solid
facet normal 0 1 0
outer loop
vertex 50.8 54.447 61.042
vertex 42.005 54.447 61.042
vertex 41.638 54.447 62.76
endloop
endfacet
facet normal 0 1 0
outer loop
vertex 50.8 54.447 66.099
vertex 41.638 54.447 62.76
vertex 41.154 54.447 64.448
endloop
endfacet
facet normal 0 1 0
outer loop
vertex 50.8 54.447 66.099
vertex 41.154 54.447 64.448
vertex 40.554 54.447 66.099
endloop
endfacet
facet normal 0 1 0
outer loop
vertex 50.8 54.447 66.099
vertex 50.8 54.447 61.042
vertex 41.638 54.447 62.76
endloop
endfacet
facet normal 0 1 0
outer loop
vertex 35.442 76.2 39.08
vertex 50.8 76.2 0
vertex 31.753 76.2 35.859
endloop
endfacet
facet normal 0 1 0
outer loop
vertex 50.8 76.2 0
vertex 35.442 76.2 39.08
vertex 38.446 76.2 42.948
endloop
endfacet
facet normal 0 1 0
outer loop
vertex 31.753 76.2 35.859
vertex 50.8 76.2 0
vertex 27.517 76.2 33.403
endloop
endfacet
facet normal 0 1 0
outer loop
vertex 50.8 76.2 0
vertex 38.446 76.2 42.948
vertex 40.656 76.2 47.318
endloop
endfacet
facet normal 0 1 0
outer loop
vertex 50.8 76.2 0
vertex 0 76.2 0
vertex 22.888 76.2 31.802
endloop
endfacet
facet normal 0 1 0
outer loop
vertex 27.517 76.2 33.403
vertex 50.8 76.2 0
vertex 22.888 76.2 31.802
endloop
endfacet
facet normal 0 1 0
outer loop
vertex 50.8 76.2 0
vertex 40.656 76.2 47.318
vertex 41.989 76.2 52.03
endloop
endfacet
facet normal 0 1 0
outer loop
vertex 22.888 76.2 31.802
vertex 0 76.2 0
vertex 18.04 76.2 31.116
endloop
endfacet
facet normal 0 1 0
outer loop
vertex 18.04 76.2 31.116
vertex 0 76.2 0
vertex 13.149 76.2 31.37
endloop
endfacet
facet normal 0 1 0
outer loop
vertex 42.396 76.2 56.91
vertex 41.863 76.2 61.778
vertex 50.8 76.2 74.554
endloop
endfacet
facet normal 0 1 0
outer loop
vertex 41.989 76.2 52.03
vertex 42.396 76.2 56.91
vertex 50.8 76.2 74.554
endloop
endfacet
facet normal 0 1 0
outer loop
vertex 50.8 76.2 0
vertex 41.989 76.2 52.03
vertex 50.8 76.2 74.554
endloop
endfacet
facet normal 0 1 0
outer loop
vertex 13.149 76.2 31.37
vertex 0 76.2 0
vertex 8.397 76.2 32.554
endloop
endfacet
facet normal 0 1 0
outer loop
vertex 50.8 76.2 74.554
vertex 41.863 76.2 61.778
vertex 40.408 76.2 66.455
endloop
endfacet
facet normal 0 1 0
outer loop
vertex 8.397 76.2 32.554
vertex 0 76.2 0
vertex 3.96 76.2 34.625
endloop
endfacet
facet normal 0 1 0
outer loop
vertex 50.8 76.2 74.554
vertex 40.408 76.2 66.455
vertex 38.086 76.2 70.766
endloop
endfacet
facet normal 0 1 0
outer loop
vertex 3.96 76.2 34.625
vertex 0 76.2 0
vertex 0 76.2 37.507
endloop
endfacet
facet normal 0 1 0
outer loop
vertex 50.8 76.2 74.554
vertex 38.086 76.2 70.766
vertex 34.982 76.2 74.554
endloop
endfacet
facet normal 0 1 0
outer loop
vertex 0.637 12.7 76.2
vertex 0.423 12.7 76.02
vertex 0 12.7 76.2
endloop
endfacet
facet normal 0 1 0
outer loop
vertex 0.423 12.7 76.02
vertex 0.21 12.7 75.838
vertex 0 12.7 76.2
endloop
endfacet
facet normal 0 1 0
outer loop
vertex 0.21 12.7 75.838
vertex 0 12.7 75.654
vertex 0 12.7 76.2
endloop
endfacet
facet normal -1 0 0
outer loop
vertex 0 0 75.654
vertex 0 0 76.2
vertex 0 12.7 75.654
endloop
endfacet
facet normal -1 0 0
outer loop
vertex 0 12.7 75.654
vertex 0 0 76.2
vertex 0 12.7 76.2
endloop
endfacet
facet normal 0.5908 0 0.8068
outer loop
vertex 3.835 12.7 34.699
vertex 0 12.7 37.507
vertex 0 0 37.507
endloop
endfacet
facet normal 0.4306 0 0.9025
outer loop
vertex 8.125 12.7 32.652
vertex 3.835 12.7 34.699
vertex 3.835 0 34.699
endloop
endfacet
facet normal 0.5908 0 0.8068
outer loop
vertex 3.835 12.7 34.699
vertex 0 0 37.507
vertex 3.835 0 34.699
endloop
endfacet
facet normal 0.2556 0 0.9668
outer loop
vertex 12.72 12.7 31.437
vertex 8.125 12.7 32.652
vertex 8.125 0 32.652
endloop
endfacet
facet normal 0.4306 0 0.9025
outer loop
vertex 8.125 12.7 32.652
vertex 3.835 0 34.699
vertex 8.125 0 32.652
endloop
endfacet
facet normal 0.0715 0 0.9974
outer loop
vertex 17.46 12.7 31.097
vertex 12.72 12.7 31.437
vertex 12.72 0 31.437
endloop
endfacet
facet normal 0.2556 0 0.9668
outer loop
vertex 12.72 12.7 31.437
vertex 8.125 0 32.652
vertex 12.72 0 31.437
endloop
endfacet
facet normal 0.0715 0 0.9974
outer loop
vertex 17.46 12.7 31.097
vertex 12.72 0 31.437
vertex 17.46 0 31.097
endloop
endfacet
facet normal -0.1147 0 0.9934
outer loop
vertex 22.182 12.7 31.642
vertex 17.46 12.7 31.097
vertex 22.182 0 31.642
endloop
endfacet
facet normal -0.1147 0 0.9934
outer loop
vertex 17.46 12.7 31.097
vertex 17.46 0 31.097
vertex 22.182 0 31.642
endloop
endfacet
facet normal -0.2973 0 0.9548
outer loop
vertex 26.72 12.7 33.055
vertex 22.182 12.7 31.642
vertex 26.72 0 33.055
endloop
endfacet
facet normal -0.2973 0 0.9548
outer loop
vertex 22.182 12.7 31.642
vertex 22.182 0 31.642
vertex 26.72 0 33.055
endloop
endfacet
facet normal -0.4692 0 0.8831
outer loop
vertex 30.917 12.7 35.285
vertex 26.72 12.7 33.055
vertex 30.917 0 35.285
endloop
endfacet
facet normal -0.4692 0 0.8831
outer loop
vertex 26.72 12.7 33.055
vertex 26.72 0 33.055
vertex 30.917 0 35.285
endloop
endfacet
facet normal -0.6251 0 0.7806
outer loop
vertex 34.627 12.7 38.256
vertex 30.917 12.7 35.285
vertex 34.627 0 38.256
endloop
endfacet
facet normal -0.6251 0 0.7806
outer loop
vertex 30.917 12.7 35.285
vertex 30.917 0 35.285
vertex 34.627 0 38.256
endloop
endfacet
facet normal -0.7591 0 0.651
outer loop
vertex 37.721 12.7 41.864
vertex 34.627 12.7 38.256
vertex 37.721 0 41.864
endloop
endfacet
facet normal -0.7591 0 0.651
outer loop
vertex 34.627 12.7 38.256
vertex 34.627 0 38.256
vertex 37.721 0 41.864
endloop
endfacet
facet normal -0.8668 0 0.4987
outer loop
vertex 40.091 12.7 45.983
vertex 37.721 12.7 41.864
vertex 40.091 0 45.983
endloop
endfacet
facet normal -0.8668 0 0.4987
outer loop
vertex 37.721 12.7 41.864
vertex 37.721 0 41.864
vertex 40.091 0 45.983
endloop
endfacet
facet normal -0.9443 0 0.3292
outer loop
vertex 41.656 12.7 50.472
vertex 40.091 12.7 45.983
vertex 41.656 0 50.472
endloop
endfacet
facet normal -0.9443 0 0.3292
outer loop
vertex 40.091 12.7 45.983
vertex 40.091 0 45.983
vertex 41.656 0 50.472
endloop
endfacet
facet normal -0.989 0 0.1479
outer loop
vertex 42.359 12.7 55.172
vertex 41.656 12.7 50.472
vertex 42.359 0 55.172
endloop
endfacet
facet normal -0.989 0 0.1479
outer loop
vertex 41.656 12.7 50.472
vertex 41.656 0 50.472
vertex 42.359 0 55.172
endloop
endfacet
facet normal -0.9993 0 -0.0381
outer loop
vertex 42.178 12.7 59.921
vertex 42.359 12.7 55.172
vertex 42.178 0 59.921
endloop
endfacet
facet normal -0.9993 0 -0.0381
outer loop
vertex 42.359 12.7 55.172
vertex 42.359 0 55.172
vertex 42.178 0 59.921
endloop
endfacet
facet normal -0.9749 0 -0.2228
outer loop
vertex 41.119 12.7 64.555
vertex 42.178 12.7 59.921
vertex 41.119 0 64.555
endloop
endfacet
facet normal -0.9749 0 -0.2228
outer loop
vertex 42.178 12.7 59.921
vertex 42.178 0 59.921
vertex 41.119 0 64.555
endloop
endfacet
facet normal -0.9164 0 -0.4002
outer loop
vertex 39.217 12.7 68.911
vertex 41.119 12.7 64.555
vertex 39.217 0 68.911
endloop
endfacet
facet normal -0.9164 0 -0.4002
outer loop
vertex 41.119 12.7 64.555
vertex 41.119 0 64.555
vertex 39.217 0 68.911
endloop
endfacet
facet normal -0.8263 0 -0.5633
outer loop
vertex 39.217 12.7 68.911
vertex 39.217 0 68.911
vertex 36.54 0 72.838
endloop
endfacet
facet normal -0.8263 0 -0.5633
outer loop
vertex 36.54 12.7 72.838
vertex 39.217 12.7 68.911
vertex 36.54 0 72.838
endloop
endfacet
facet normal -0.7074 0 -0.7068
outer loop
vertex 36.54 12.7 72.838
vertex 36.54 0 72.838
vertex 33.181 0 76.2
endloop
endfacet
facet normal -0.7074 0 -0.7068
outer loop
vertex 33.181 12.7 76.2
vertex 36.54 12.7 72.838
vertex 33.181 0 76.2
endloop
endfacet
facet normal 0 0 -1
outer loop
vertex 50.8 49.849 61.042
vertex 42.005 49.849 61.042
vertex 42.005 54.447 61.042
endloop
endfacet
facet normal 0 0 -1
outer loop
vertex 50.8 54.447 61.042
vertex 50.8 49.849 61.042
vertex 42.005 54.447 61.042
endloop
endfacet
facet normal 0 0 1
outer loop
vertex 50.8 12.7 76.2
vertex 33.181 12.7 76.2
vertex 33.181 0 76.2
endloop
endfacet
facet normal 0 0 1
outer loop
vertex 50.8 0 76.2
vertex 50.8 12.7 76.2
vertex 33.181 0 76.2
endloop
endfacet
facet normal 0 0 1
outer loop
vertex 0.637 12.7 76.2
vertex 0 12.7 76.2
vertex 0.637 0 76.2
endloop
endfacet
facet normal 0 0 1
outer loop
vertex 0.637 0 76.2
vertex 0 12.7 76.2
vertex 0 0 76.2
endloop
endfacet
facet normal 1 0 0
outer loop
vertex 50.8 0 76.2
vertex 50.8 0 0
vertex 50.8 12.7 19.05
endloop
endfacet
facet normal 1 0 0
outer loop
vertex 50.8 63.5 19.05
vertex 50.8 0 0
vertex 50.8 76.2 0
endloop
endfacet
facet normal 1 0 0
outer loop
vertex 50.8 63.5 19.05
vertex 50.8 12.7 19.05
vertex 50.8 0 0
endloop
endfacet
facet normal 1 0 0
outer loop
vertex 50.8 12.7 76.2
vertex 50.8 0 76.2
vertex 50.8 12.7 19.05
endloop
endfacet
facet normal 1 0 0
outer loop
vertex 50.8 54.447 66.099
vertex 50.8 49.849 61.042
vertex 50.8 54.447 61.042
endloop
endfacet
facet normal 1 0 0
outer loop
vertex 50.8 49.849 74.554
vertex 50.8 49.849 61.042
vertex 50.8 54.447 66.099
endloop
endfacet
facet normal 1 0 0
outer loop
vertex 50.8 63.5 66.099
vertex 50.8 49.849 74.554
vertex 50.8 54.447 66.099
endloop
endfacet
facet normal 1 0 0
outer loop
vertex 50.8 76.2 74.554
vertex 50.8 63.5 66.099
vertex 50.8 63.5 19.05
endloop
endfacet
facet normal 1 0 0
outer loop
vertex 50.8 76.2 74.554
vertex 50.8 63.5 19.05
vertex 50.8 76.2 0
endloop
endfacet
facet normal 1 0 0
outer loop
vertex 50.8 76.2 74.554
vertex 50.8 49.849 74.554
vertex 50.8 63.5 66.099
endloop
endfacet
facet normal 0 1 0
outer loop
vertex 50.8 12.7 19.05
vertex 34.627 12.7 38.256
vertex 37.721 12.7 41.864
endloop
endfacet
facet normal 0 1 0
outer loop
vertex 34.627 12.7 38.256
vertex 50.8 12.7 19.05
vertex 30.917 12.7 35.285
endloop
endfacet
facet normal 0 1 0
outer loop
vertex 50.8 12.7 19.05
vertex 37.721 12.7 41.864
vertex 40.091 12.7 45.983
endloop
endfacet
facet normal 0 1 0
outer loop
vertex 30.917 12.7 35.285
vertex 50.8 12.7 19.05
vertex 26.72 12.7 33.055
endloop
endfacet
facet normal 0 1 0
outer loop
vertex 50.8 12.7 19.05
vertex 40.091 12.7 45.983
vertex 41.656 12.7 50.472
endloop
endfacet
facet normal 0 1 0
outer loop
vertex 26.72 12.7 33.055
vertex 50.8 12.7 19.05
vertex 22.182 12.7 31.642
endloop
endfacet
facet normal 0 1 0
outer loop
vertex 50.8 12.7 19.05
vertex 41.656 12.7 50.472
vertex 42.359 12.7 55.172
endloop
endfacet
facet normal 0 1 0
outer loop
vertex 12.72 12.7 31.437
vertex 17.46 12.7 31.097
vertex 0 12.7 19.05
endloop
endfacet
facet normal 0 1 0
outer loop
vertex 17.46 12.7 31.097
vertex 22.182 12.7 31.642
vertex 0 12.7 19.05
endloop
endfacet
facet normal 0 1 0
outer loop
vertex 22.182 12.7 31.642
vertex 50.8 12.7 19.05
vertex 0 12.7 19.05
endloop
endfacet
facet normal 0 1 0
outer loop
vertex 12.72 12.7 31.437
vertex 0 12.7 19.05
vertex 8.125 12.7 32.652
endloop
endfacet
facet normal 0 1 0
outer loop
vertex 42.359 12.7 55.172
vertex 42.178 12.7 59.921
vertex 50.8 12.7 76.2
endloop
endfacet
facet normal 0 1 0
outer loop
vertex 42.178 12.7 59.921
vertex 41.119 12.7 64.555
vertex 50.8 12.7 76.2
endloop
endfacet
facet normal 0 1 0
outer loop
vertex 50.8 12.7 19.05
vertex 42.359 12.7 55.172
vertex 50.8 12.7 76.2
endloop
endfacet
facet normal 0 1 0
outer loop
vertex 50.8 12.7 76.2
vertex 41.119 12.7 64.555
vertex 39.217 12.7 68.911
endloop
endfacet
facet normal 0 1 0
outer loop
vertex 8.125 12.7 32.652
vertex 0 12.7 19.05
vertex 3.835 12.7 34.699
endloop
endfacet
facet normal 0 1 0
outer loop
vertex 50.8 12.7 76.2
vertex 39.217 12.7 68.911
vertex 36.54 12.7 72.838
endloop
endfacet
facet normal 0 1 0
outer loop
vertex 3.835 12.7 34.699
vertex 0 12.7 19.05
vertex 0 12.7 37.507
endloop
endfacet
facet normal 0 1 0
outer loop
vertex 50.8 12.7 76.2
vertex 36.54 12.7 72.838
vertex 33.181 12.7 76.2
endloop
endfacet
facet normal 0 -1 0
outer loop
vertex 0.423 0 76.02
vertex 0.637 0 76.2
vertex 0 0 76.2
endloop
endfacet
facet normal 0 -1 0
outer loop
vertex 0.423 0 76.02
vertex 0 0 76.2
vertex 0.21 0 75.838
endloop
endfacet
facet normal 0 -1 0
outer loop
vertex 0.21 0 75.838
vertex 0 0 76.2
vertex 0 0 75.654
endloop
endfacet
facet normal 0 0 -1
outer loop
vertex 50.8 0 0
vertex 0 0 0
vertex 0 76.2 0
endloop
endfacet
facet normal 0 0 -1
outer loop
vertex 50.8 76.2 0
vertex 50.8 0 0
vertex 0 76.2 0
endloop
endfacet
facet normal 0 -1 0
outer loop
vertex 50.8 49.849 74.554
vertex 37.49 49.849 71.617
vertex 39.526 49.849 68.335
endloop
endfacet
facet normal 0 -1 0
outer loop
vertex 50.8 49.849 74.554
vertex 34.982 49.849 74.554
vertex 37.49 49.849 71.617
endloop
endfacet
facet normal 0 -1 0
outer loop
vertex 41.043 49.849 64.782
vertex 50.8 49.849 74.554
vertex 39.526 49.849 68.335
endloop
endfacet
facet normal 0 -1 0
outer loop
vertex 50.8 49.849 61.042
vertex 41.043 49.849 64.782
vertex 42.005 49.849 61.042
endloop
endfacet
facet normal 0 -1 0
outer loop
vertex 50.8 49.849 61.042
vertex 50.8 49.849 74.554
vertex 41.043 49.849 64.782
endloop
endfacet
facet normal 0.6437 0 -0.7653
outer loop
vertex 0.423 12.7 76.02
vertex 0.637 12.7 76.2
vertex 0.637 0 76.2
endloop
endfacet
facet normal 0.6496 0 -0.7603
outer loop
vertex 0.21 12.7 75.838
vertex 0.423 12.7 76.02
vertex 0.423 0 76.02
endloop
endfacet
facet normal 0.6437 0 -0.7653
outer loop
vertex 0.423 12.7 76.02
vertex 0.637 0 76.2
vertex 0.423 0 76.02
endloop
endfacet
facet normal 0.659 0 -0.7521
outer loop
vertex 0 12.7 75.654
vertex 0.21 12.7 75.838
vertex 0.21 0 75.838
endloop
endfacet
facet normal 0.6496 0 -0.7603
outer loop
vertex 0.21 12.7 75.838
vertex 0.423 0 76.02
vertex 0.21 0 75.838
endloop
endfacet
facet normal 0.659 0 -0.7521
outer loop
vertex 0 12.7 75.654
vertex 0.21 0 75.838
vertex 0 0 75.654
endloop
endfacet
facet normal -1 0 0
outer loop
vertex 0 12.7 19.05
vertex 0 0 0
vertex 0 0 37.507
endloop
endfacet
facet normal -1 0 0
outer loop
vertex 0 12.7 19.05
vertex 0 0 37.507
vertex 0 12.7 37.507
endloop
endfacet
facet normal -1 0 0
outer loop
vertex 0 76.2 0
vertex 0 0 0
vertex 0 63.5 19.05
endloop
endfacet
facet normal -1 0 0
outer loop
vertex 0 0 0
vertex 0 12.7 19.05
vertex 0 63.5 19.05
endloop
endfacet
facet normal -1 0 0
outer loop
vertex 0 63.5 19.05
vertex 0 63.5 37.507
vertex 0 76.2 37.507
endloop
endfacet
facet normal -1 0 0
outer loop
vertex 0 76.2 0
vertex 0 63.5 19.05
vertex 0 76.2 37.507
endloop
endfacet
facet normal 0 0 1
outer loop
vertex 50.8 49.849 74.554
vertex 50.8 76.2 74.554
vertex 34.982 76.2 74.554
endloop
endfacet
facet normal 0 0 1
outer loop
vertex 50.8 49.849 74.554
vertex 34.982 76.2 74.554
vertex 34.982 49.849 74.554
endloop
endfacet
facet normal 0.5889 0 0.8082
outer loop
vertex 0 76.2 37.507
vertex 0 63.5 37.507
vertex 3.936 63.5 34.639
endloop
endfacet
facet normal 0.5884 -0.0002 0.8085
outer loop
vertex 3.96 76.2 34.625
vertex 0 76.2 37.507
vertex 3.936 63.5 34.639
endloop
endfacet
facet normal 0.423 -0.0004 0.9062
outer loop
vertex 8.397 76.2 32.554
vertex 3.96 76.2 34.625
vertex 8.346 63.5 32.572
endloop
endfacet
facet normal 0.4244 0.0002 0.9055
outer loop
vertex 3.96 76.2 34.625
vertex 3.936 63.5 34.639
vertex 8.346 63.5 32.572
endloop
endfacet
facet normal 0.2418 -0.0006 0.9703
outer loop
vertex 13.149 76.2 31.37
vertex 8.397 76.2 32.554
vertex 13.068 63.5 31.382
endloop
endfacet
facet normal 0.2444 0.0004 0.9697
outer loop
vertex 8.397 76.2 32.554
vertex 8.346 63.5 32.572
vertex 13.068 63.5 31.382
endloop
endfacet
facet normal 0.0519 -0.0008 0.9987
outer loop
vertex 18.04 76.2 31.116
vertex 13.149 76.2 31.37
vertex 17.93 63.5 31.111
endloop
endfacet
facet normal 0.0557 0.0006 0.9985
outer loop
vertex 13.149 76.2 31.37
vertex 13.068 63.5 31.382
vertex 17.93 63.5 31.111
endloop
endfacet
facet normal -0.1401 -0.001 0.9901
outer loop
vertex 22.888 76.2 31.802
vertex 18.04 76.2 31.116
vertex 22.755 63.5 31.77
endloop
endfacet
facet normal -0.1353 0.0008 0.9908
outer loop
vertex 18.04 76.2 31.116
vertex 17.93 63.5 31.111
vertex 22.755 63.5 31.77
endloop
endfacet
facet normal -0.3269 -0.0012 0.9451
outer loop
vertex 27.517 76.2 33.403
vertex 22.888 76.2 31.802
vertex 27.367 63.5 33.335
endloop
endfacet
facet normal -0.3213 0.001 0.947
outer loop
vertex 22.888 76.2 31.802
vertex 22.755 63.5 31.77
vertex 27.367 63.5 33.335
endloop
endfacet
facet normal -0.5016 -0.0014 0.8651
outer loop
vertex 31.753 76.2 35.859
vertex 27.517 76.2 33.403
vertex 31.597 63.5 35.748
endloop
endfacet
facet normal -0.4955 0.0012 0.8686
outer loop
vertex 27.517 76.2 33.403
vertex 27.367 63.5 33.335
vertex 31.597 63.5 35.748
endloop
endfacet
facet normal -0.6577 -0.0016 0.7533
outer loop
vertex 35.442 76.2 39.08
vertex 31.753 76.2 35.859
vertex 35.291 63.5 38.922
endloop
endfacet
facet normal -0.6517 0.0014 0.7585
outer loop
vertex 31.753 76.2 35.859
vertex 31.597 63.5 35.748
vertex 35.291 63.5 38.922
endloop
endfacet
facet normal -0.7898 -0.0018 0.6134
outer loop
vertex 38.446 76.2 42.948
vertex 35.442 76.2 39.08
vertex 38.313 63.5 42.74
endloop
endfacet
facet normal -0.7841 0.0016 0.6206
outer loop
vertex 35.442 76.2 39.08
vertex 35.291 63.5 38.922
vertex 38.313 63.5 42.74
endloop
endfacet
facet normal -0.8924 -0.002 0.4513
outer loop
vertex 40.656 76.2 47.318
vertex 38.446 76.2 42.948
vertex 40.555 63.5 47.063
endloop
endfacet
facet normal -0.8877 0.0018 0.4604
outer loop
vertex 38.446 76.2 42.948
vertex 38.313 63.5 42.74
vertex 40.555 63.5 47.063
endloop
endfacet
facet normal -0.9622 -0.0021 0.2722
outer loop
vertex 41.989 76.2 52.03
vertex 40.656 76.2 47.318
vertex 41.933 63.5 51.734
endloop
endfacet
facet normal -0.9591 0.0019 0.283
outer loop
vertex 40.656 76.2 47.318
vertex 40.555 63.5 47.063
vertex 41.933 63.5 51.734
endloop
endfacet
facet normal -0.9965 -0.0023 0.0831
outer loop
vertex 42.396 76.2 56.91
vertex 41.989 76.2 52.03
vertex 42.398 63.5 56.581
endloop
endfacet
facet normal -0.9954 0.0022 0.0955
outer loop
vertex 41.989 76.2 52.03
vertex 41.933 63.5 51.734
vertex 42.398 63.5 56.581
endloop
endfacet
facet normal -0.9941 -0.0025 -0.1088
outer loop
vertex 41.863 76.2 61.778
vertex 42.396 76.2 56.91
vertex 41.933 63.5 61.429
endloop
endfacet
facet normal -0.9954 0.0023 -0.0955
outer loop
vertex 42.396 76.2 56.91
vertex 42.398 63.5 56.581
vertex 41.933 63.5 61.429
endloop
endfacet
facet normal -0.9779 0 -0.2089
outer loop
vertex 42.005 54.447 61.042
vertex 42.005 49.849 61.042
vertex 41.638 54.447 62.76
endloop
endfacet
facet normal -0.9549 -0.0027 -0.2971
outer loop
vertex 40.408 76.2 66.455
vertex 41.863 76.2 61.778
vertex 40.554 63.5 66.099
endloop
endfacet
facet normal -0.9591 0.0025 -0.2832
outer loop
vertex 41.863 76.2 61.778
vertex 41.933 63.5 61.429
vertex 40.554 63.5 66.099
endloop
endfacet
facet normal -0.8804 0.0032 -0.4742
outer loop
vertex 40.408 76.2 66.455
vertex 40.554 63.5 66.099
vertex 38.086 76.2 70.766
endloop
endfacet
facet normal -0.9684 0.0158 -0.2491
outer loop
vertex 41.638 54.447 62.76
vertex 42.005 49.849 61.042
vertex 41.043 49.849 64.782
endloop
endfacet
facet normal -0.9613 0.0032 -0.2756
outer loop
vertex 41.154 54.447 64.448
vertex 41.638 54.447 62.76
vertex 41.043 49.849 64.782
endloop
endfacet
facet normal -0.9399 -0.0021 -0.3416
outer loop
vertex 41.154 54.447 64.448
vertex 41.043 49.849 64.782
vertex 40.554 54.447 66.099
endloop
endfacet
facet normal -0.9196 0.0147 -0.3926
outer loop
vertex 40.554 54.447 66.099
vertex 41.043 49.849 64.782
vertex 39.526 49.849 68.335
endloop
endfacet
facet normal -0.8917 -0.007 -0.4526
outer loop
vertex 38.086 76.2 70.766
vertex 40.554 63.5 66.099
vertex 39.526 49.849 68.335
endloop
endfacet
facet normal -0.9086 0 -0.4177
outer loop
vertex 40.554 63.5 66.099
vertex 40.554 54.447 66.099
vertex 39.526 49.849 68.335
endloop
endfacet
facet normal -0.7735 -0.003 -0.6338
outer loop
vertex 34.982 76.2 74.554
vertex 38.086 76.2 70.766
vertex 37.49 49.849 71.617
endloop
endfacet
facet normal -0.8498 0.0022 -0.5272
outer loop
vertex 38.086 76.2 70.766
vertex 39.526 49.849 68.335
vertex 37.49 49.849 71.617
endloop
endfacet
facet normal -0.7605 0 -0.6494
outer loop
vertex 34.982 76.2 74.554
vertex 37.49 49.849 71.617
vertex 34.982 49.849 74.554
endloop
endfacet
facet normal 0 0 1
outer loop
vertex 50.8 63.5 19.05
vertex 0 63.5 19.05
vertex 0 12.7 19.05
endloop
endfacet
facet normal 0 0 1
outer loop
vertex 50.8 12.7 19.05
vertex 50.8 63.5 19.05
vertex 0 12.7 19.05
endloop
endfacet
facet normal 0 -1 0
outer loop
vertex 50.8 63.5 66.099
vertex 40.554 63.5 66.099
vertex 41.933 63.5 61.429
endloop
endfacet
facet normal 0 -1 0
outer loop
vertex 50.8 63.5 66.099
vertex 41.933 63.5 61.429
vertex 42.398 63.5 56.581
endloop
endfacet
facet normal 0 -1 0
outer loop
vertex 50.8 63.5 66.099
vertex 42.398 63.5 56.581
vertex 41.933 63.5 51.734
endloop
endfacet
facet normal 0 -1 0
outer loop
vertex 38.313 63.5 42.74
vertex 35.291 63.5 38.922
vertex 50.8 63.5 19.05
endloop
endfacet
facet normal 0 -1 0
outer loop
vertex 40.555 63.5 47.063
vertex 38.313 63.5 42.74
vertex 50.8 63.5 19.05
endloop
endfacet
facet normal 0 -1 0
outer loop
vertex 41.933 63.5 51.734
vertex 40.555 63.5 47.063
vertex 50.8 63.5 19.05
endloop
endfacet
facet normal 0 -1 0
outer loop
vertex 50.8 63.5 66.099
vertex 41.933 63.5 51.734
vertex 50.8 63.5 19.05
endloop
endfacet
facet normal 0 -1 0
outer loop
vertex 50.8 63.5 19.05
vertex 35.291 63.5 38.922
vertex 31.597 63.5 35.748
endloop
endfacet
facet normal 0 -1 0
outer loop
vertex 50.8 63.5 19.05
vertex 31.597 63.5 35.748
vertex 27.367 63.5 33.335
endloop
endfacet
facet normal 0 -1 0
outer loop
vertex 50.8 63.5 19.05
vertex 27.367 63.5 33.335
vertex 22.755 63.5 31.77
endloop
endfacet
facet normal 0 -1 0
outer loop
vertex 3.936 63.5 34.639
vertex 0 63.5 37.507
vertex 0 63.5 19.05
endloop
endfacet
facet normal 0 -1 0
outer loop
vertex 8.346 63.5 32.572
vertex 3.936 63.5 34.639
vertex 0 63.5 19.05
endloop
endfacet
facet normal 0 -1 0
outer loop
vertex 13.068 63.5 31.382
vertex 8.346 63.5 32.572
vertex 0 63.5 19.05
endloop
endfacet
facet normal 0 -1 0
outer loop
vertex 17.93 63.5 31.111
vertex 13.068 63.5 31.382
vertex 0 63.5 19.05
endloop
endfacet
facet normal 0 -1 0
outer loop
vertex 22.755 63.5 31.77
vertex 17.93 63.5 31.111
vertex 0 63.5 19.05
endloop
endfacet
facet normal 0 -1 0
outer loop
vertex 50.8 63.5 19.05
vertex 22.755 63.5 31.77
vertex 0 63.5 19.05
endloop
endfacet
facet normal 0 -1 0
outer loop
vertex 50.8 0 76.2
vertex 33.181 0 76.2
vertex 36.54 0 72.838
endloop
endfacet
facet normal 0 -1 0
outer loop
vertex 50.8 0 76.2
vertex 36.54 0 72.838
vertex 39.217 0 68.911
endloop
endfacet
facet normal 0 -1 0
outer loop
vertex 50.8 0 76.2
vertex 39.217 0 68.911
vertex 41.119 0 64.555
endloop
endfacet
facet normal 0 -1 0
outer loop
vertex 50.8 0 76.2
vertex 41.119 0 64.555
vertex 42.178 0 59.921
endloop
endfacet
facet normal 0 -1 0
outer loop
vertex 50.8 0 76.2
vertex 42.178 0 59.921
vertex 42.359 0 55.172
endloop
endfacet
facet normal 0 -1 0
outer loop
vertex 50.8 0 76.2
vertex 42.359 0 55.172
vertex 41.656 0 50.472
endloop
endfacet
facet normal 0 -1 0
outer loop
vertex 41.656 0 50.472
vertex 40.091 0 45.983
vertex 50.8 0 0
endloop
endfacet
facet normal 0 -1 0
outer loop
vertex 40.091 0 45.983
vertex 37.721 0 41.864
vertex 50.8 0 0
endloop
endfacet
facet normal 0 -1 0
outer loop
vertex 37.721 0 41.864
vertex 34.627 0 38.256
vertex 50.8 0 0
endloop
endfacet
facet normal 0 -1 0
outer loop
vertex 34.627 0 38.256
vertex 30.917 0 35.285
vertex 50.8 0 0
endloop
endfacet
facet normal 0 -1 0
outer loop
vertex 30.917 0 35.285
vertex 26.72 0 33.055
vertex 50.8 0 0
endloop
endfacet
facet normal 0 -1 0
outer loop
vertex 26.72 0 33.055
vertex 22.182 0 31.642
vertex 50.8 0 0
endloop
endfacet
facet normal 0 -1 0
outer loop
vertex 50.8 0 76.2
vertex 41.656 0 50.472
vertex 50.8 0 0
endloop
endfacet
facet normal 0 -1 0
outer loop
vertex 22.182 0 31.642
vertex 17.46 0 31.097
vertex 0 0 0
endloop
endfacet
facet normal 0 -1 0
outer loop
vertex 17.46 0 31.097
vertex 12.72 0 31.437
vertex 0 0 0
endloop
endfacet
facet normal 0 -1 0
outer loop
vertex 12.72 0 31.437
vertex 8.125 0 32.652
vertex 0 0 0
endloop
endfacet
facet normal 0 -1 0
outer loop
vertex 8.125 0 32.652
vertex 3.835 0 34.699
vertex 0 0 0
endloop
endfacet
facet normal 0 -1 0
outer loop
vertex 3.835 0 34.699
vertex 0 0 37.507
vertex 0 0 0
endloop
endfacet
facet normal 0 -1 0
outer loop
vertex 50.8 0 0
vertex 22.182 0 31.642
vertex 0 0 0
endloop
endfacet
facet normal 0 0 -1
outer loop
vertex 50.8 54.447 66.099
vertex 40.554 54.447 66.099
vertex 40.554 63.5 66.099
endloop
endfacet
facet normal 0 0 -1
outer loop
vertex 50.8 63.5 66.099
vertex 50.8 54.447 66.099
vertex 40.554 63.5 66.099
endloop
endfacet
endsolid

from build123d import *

# Parameters (mm, degrees)
F1_DEPTH = 50.8
F4_DEPTH = 25.4
F3_R     = 25.489353
F5_DEPTH = 76.201


with BuildPart() as f1:
    # F0 (on Right) → F1 (new body)
    with BuildSketch(Plane.YZ):
        Polygon((0, 76.2), (0, 0), (76.2, 0), (76.2, 74.554215), (63.5, 74.554215), (63.5, 19.05), (12.7, 19.05), (12.7, 76.2), align=None)
    extrude(amount=F1_DEPTH)

    # F2 (on face) → F4 (join)
    with BuildSketch(Plane.YZ.offset(50.8)):
        Polygon((63.5, 66.099487), (63.5, 74.554215), (49.849384, 74.554215), (49.849384, 61.041892), (54.4472, 61.041892), (54.4472, 66.099487), align=None)
    extrude(amount=-F4_DEPTH)

    # F3 (on face) → F5 (cut, through all)
    with BuildSketch(Plane.XZ):
        with Locations((16.908981, 56.580197)):
            Circle(F3_R)
    extrude(amount=-F5_DEPTH, mode=Mode.SUBTRACT)


solid = f1.part
